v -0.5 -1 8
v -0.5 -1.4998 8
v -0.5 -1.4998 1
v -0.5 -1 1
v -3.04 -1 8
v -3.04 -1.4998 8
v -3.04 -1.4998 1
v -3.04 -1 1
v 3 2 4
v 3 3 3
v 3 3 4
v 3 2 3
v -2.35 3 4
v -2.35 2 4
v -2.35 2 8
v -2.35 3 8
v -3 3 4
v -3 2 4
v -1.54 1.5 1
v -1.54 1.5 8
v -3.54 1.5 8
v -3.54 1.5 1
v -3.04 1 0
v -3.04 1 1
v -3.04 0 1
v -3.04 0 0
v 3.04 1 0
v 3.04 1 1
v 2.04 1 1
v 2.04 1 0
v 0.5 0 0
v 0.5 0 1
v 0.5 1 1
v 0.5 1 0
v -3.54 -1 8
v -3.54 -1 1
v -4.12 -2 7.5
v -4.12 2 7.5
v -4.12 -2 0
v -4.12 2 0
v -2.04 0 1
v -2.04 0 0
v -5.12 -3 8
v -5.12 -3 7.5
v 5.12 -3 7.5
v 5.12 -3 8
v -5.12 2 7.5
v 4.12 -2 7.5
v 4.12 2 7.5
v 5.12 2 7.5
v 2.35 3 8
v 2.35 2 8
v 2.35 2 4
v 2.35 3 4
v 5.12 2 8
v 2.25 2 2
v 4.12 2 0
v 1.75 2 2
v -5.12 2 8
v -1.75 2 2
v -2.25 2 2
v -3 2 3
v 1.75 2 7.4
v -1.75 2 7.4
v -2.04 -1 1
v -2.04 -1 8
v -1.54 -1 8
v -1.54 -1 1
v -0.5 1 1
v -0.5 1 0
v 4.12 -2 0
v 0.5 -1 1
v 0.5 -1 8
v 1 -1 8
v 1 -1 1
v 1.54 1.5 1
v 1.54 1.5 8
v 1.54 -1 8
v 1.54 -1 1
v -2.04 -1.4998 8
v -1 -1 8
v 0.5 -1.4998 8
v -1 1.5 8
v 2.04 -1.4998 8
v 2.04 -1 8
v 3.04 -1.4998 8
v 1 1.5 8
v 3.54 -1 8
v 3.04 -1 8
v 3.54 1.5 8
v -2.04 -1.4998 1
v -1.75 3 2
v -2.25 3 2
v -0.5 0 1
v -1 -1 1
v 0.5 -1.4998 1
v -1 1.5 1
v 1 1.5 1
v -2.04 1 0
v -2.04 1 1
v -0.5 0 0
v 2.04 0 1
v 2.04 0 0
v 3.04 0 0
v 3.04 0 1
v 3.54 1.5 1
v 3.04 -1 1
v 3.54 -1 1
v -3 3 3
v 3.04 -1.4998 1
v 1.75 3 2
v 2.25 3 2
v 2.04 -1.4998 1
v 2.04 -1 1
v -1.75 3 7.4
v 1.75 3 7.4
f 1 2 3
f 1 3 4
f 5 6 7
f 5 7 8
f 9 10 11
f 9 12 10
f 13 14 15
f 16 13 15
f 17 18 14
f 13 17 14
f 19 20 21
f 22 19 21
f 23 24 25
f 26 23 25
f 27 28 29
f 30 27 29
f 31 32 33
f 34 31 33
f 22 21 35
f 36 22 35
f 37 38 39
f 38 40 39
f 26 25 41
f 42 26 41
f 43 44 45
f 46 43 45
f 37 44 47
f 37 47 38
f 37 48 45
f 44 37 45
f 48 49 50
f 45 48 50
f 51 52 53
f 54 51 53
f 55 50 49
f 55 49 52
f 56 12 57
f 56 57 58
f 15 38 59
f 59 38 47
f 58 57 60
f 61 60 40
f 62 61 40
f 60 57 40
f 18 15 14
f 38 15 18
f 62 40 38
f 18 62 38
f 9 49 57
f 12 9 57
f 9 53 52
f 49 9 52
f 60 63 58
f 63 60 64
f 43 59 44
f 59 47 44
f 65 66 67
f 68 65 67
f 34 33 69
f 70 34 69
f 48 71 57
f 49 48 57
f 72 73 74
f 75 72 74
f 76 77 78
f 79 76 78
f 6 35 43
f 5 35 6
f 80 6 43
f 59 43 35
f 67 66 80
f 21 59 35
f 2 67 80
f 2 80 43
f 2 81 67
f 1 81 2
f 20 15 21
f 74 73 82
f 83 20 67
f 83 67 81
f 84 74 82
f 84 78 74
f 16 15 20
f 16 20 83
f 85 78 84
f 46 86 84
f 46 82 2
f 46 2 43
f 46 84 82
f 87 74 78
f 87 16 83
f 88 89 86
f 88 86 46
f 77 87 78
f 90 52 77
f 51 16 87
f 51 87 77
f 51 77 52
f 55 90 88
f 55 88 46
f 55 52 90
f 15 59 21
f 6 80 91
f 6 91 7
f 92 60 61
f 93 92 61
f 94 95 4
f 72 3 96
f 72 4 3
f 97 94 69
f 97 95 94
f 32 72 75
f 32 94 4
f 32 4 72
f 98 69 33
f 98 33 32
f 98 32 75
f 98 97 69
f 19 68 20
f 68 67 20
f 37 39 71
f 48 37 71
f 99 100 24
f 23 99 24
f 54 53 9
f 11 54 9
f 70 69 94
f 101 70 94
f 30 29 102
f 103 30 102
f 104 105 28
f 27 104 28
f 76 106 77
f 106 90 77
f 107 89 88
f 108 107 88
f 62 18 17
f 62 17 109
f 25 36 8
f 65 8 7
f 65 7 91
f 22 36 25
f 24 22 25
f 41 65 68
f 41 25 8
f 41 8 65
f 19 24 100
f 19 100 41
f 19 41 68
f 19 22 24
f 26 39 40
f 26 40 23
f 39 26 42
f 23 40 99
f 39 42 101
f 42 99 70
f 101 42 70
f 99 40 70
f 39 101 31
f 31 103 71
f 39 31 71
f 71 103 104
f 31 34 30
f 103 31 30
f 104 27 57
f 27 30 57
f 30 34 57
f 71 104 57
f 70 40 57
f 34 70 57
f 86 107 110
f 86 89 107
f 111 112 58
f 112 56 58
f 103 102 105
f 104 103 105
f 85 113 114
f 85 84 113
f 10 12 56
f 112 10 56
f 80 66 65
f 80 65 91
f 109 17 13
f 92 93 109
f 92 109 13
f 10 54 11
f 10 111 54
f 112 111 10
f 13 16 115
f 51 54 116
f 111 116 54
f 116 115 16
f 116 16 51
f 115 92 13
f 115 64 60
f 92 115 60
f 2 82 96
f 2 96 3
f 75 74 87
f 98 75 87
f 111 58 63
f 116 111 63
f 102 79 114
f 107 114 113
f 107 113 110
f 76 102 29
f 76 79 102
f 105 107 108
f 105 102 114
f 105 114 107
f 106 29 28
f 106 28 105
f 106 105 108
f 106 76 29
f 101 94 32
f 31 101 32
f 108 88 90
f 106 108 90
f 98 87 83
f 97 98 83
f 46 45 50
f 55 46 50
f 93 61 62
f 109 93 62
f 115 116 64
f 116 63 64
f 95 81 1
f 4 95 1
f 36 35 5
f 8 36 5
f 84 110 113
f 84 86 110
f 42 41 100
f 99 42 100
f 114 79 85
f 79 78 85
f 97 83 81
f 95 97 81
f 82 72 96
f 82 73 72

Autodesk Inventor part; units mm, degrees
ref_plane "YZ Plane" through (0, 0, 0) normal (1, 0, 0) x (0, 1, 0)
ref_plane "XZ Plane" through (0, 0, 0) normal (0, 1, 0) x (-1, 0, 0)
ref_plane "XY Plane" through (0, 0, 0) normal (0, 0, 1) x (1, 0, 0)
sketch "Esquisse1" plane through (0, 0, 0) normal (0, 0, 1) x (1, 0, 0)
  line L0 (-4.12, -2) -> (4.12, -2)
  line L1 (4.12, -2) -> (4.12, 2)
  line L2 (4.12, 2) -> (-4.12, 2)
  line L3 (-4.12, 2) -> (-4.12, -2)
  line L4 (-4.12, -2) -> (4.12, 2) construction
  line L5 (4.12, -2) -> (-4.12, 2) construction
  point P0 (0, 0)
  dimension "d0" = 8.24
  dimension "d1" = 4
extrude "Embase" add sketch "Esquisse1" along normal blind 7.5
sketch "Esquisse2" plane through (0, 0, 7.5) normal (0, 0, 1) x (1, 0, 0)
  line L0 (-5.12, -3) -> (5.12, -3)
  line L1 (5.12, -3) -> (5.12, 2)
  line L2 (5.12, 2) -> (-5.12, 2)
  line L3 (-5.12, 2) -> (-5.12, -3)
  line L4 (-5.12, -3) -> (5.12, 2) construction
  line L5 (5.12, -3) -> (-5.12, 2) construction
  line L6 (4.12, 2) -> (-4.12, 2) projected
  line L7 (4.12, -2) -> (4.12, 2) projected
  point P0 (0, -0.5)
  point P1 (0, 0)
  point P2 (0, -0.5)
  dimension "d5" = 5
  dimension "d9" = 1
extrude "Epaulement" add sketch "Esquisse2" along normal blind 0.5
sketch "Esquisse4" plane through (-4.12, 2, 0) normal (0, 1, 0) x (1, 0, 0)
  line L0 (5.87, -2) -> (5.87, -7.4)
  line L1 (5.87, -7.4) -> (2.37, -7.4)
  line L2 (2.37, -7.4) -> (2.37, -2)
  line L3 (2.37, -2) -> (1.87, -2)
  line L4 (1.87, -2) -> (1.12, -3)
  line L5 (1.12, -4) -> (1.77, -4)
  line L6 (1.77, -4) -> (1.77, -8)
  line L7 (1.77, -8) -> (6.47, -8)
  line L8 (6.47, -8) -> (6.47, -4)
  line L9 (6.47, -4) -> (7.12, -4)
  line L10 (7.12, -3) -> (6.37, -2)
  line L11 (6.37, -2) -> (5.87, -2)
  line L12 (8.24, 0) -> (0, 0) projected
  line L13 (9.24, -8) -> (-1, -8) construction
  line L14 (7.12, -3) -> (7.12, -4)
  line L15 (1.12, -4) -> (1.12, -3)
  point P0 (4.12, 0)
  point P1 (4.12, -7.4)
  point P2 (4.12, 0)
  dimension "d10" = 0.6
  dimension "d11" = 0.6
  dimension "Entre_clip" = 3.5
  dimension "d13" = 6
  dimension "d14" = 4
  dimension "d15" = 1
  dimension "d16" = 0.6
  dimension "d18" = 0.5
  dimension "d21" = 0.65
extrude "Clip" add sketch "Esquisse4" along normal blind 1
sketch "Esquisse5" plane through (0, 0, 8) normal (0, 0, 1) x (1, 0, 0)
  line L0 (3.54, -1) -> (3.54, 1.5)
  line L1 (3.54, 1.5) -> (1.54, 1.5)
  line L2 (1.54, 1.5) -> (1.54, -1)
  line L3 (5.12, -3) -> (5.12, 2) projected
  line L4 (2.54, 1.25) -> (2.54, -1.75) construction
  line L5 (3.04, -1) -> (3.04, -1.4998)
  line L6 (3.04, -1.4998) -> (2.04, -1.4998)
  line L7 (2.04, -1.4998) -> (2.04, -1)
  line L8 (1.54, -1) -> (2.04, -1)
  line L9 (3.04, -1) -> (3.54, -1)
  line L10 (5.12, 2) -> (2.35, 2) projected
  point P0 (0, 0)
  point P1 (2.04, 1.5)
  point P2 (3.54, 0.25)
  point P3 (5.12, -0.5)
  point P4 (2.54, -1.713)
  point P5 (2.54, -1.4998)
  point P6 (2.54, 1.5)
  dimension "d22" = 2.58
  dimension "d24" = 2.5
  dimension "d34" = 0.4998
  dimension "d35" = 1
  dimension "d36" = 2
  dimension "d37" = 0.5
extrude "Extrusion4" cut sketch "Esquisse5" against normal blind 7
sketch "Esquisse6" plane through (0, 0, 1) normal (0, 0, 1) x (1, 0, 0)
  line L0 (2.04, 0) -> (3.04, 0)
  line L1 (3.04, 0) -> (3.04, 1)
  line L2 (3.04, 1) -> (2.04, 1)
  line L3 (2.04, 1) -> (2.04, 0)
  line L4 (2.04, -1) -> (1.54, -1) projected
  line L5 (1.54, 1.5) -> (3.54, 1.5) projected
  line L6 (3.04, -1.4998) -> (2.04, -1.4998) projected
  point P0 (0, 0)
  point P1 (2.54, 1)
  point P2 (2.96, -1.75)
  point P3 (2.54, 0)
  point P4 (2.54, -1.4998)
  dimension "d29" = 1
  dimension "d30" = 1
  dimension "d38" = 0.5
extrude "Extrusion5" cut sketch "Esquisse6" against normal through all
pattern_linear "Réseau rectangulaire1" count 3 spacing 2.54 along (-1, 0, 0) of "Extrusion4", "Extrusion5"
equation "\"d11\" = d10"
equation "\"Entre_clip\" = 1.16667 * Nb_broche"
equation "\"d16\" = d11"
equation "\"Pas\" = 2.54"
equation "\"Nb_broche\" = 3"
properties part number "Connecteur JST 3 Broches Male" material "Plastique ABS"
